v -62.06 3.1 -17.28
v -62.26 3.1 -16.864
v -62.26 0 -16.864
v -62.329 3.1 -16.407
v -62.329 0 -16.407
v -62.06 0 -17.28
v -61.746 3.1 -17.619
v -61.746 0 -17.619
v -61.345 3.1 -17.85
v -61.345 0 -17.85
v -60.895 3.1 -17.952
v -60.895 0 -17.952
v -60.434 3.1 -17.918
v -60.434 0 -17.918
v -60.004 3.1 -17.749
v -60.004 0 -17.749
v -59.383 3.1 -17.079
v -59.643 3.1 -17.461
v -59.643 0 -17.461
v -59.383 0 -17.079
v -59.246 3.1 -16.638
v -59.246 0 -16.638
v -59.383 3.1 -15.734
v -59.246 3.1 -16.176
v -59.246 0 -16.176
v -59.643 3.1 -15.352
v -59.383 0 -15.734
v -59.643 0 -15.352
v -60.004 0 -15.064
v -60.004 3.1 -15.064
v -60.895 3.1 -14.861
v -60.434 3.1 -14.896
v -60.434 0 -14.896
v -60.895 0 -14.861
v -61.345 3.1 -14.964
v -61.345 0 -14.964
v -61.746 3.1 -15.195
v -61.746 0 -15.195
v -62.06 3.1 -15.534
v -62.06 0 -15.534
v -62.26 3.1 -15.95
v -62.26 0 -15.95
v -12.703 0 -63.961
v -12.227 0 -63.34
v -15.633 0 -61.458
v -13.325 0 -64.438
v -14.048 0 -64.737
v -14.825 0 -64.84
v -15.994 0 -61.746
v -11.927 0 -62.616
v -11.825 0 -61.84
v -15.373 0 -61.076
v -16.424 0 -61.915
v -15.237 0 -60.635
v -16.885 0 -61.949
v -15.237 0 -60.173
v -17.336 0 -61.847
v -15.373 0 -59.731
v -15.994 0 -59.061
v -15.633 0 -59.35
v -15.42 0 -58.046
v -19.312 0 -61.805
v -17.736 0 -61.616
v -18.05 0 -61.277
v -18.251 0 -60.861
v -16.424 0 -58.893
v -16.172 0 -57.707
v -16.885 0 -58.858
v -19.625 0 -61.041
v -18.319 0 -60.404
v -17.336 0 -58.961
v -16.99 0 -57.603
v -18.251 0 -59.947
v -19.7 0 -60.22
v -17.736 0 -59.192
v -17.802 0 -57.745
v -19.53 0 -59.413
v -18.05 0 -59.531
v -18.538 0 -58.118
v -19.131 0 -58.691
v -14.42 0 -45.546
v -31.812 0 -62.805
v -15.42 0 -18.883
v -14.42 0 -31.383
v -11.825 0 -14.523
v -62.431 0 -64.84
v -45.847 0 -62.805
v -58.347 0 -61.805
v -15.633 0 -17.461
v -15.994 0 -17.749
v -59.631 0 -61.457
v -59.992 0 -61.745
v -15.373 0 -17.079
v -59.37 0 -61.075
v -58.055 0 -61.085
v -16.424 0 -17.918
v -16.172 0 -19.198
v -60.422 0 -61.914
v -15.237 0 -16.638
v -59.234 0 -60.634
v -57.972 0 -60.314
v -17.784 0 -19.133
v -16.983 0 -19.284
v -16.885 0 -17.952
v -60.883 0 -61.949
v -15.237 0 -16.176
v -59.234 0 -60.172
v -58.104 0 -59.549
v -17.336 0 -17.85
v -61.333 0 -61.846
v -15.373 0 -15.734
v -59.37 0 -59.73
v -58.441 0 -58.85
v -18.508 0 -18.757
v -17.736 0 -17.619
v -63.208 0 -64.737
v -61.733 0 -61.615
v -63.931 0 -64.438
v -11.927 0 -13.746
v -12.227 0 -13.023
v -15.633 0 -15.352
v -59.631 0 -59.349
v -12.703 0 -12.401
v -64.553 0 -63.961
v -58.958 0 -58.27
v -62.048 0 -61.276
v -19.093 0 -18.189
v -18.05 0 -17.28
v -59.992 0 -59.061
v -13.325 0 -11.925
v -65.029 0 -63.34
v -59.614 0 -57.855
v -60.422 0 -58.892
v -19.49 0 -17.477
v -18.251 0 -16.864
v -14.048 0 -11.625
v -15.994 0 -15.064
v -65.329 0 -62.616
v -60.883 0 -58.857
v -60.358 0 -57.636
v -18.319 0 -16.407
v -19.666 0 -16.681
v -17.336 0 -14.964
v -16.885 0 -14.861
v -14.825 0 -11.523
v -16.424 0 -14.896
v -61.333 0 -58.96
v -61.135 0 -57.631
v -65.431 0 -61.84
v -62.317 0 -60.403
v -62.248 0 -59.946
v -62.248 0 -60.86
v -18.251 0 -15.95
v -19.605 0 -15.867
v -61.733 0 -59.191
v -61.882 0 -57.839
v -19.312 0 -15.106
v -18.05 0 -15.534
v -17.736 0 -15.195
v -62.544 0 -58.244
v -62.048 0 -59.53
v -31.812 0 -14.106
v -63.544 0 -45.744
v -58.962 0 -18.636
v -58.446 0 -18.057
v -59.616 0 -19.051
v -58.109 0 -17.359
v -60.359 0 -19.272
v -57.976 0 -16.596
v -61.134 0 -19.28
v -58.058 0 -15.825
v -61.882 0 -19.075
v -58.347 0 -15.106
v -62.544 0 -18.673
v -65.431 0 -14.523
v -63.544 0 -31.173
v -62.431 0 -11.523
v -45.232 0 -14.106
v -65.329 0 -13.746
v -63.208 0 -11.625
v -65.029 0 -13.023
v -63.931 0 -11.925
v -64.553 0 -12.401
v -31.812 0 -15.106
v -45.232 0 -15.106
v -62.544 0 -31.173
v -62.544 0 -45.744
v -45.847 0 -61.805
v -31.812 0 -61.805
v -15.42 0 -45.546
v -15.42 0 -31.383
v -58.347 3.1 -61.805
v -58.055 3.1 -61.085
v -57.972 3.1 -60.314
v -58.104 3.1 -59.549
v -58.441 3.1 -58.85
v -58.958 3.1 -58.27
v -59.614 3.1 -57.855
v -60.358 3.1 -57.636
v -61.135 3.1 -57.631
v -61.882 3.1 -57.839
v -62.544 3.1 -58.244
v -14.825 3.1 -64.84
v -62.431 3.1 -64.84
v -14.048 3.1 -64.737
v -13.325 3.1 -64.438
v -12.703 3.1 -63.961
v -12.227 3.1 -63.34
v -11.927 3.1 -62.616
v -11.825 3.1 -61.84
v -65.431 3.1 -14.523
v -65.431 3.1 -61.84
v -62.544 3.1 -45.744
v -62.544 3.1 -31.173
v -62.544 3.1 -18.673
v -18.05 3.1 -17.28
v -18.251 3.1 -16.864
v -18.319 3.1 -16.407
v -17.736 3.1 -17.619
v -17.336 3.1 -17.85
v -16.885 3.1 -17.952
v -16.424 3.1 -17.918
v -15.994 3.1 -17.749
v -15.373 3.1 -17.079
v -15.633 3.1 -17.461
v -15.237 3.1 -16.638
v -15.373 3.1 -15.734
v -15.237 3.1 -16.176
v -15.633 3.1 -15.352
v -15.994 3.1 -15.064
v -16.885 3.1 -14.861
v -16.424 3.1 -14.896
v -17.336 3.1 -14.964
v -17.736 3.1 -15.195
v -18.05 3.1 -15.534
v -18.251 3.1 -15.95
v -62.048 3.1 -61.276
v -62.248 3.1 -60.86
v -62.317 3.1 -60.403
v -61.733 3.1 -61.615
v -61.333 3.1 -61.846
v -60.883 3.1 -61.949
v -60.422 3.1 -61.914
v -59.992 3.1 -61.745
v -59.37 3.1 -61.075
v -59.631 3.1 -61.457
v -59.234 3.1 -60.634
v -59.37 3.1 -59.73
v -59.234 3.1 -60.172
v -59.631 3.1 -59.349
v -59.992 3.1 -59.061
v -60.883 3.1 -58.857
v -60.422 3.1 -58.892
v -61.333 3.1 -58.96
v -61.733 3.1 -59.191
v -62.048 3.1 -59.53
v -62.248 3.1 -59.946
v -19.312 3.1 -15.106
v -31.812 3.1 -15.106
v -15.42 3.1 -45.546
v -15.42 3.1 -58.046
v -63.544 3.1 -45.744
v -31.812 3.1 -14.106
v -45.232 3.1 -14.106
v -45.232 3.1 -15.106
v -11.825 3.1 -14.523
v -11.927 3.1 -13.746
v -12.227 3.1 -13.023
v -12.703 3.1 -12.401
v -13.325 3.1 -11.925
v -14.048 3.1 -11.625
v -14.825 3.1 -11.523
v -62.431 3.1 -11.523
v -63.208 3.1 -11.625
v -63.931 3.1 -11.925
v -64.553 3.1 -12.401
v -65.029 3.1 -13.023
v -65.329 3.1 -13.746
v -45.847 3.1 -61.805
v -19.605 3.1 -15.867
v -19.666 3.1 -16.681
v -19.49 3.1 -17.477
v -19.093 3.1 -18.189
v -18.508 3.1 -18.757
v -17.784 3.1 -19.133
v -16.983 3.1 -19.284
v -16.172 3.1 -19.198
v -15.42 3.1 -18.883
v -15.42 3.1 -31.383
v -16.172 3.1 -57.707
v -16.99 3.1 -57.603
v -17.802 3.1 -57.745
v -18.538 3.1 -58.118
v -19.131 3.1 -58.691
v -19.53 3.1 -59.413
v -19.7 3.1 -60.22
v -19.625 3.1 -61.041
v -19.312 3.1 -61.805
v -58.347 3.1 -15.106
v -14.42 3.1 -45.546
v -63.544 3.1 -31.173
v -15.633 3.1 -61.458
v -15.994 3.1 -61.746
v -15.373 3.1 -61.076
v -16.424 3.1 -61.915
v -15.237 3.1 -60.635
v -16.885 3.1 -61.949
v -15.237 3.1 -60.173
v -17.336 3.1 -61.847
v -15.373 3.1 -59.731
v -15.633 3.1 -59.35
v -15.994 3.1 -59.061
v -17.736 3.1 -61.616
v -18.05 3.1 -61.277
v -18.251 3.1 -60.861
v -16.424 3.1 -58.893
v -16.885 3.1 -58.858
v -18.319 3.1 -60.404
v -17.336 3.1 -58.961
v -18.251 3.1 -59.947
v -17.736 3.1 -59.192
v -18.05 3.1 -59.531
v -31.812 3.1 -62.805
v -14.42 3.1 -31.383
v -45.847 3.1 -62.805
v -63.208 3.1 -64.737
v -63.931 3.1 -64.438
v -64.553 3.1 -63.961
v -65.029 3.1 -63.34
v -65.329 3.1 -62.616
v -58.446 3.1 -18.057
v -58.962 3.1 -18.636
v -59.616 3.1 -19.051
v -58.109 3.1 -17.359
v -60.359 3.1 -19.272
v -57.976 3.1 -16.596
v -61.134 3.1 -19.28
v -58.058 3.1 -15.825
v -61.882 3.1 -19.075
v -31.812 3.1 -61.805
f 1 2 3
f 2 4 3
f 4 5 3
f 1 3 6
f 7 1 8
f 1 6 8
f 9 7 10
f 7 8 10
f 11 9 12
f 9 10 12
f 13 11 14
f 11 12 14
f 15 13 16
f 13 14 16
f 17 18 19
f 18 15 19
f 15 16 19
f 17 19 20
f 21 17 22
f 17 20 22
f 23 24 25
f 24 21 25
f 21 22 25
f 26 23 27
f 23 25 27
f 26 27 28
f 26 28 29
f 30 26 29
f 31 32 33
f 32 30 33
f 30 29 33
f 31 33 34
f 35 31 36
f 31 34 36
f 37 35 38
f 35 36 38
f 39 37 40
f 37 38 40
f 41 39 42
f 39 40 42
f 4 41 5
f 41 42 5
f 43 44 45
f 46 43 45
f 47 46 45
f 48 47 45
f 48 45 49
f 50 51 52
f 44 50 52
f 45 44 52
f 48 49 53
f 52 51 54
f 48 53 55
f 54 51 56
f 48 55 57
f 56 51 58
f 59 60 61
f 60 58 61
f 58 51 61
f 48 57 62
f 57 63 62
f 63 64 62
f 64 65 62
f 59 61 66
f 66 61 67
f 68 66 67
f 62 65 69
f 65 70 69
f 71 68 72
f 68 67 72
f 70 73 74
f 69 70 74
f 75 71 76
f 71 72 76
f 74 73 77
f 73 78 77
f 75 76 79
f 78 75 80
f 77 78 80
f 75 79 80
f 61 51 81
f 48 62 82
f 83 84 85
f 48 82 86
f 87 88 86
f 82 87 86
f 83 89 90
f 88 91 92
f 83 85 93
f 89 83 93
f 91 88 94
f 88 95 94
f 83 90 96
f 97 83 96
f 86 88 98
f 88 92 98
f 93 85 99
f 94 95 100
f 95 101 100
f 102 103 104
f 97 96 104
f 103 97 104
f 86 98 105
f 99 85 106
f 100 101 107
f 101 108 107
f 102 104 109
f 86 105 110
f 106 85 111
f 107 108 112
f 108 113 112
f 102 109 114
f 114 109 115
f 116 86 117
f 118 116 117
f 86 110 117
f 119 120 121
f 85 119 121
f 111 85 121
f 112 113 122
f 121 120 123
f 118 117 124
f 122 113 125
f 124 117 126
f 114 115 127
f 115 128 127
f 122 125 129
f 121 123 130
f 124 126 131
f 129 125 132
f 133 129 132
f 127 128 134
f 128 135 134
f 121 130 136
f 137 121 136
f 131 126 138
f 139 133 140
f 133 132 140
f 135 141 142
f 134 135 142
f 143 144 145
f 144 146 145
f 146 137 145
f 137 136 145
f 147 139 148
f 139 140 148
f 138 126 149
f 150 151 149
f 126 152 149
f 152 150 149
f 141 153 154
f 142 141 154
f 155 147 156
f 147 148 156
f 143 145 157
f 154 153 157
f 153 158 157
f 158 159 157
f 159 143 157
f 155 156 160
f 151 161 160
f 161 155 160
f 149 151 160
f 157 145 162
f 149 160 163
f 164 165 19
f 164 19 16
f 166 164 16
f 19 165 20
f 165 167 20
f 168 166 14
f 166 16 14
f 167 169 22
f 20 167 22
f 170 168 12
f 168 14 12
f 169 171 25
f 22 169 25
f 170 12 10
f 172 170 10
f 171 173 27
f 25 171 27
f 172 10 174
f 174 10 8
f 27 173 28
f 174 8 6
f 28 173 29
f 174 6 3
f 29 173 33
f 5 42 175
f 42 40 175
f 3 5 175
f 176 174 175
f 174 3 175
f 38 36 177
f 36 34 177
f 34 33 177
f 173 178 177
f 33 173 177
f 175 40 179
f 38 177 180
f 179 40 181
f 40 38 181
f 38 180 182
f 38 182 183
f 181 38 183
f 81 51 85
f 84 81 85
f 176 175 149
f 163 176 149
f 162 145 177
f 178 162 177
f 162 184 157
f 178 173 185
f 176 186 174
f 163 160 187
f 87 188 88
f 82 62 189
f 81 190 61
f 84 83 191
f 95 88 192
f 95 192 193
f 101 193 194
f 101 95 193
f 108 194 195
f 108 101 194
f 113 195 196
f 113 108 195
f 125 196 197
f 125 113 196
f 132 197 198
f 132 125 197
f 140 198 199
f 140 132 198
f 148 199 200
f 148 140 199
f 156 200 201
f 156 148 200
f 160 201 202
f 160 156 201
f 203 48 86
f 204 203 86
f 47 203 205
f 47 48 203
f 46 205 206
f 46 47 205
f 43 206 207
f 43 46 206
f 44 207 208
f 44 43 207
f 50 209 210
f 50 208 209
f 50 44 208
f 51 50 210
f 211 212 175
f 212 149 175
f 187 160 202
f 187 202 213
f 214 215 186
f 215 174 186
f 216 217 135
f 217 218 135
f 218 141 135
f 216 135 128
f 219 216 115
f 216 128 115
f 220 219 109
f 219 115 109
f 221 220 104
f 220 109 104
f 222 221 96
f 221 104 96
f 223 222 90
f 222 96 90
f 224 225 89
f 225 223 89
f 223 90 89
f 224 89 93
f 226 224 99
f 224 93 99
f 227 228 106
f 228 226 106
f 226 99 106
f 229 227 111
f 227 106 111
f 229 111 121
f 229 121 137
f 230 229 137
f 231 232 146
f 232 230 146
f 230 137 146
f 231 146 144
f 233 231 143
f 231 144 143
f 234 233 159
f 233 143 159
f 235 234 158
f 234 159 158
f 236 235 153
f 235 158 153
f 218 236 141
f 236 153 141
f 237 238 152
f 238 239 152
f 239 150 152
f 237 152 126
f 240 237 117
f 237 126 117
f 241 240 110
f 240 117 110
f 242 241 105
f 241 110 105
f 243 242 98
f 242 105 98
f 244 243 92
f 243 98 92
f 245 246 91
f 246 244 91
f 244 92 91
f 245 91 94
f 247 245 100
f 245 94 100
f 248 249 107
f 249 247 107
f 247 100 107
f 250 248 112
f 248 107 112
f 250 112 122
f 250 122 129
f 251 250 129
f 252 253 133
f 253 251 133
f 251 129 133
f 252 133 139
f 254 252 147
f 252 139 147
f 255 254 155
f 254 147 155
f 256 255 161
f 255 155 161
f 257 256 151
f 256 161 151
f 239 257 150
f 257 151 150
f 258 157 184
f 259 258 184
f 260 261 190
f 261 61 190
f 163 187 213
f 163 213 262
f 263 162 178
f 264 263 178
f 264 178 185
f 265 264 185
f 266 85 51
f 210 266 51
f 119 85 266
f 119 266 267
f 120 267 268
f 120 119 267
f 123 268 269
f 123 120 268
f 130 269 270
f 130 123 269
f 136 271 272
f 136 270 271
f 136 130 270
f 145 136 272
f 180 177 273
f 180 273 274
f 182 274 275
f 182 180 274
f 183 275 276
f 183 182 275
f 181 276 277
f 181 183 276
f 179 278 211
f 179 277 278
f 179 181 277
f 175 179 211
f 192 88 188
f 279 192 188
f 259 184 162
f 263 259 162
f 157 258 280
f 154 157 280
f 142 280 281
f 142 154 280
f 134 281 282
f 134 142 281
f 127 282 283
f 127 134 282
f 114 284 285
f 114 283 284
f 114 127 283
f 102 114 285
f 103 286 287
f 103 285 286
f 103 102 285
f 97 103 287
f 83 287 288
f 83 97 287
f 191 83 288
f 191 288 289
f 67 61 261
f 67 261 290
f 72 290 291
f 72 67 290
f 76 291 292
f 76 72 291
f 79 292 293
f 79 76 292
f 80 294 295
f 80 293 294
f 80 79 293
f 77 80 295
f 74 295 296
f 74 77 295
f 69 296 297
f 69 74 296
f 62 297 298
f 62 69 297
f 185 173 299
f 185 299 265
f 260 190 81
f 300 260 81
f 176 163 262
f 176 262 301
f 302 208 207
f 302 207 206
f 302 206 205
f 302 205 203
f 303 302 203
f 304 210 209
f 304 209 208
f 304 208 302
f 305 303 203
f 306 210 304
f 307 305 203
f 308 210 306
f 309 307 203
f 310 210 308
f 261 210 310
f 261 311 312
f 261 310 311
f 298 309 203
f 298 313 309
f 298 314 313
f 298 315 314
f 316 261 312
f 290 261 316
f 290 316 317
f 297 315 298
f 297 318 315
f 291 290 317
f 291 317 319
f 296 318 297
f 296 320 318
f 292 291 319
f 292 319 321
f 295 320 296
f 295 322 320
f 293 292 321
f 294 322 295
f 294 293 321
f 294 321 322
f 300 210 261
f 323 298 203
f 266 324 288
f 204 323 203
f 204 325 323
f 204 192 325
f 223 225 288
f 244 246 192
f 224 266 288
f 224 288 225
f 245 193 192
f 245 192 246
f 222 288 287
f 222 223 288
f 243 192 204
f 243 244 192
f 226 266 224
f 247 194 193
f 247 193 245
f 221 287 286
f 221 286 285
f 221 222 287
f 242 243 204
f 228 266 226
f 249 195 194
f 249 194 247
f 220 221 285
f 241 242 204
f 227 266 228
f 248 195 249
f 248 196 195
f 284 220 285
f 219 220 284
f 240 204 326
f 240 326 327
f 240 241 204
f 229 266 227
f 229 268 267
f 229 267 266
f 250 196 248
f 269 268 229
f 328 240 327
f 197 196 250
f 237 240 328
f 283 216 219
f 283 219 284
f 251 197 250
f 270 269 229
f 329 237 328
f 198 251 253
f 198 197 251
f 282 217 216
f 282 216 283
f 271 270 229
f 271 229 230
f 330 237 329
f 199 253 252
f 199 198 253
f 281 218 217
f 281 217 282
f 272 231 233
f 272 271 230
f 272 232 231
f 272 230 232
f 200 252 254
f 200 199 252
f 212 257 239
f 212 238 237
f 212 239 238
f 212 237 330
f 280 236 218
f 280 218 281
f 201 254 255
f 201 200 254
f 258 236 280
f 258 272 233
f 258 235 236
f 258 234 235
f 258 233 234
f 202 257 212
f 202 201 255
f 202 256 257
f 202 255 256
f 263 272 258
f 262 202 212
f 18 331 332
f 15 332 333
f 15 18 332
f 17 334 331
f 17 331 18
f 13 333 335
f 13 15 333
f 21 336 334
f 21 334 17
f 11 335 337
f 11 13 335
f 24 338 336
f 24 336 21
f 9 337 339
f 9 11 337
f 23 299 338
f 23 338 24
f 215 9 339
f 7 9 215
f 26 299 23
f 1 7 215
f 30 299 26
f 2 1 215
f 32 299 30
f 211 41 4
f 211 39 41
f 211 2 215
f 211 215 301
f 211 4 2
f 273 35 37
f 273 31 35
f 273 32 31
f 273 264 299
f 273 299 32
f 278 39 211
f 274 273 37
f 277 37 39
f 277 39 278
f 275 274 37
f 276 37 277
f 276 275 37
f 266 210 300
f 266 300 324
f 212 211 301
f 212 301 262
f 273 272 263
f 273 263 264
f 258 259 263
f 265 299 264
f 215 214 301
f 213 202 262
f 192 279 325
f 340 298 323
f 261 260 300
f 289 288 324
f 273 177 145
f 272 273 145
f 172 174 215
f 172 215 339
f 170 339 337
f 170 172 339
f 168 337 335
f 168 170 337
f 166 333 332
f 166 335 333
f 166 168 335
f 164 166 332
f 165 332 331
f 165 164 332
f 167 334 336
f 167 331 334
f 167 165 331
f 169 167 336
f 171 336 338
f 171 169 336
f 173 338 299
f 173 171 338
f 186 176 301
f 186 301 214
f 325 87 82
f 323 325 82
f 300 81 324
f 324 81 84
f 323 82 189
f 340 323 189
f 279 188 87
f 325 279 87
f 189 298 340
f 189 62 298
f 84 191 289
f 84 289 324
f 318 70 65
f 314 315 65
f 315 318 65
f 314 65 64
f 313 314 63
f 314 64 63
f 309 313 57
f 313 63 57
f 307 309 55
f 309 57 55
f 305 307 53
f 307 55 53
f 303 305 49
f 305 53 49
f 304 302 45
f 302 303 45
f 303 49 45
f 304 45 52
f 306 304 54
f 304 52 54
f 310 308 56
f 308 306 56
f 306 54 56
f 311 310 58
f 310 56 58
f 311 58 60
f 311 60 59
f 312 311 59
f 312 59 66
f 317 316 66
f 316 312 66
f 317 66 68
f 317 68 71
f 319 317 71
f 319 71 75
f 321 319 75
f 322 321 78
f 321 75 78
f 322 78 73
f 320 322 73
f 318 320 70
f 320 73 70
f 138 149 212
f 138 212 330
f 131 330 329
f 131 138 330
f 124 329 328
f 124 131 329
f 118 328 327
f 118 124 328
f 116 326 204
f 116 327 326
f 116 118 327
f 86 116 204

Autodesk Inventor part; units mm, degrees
ref_plane "YZ Plane" through (0, 0, 0) normal (1, 0, 0) x (0, 1, 0)
ref_plane "XZ Plane" through (0, 0, 0) normal (0, 1, 0) x (-1, 0, 0)
ref_plane "XY Plane" through (0, 0, 0) normal (0, 0, 1) x (1, 0, 0)
sketch "Baseline" plane through (0, 0, 0) normal (0, 1, 0) x (-1, 0, 0)
  line L0 (61.0726, -11.6756) -> (16.1384, -11.6756)
  spline S0 degree 3 poles (16.1384, -11.6756) (13.8101, -11.6756) (11.9051, -13.5806) (11.9051, -15.909) knots 1 1 1 1 2 2 2 2
  line L1 (16.1384, -11.6756) -> (13.8101, -11.6756) construction
  line L2 (13.8101, -11.6756) -> (11.9051, -13.5806) construction
  line L3 (11.9051, -13.5806) -> (11.9051, -15.909) construction
  line L4 (11.9051, -15.909) -> (11.9051, -60.661)
  spline S1 degree 3 poles (11.9051, -60.661) (11.9051, -62.9893) (13.8101, -64.8943) (16.1384, -64.8943) knots 3 3 3 3 4 4 4 4
  line L5 (11.9051, -60.661) -> (11.9051, -62.9893) construction
  line L6 (11.9051, -62.9893) -> (13.8101, -64.8943) construction
  line L7 (13.8101, -64.8943) -> (16.1384, -64.8943) construction
  line L8 (16.1384, -64.8943) -> (61.0726, -64.8943)
  spline S2 degree 3 poles (61.0726, -64.8943) (63.4009, -64.8943) (65.3059, -62.9893) (65.3059, -60.661) knots 5 5 5 5 6 6 6 6
  line L9 (61.0726, -64.8943) -> (63.4009, -64.8943) construction
  line L10 (63.4009, -64.8943) -> (65.3059, -62.9893) construction
  line L11 (65.3059, -62.9893) -> (65.3059, -60.661) construction
  line L12 (65.3059, -60.661) -> (65.3059, -15.909)
  spline S3 degree 3 poles (65.3059, -15.909) (65.3059, -13.5806) (63.4009, -11.6756) (61.0726, -11.6756) knots 7 7 7 7 8 8 8 8
  line L13 (65.3059, -15.909) -> (65.3059, -13.5806) construction
  line L14 (65.3059, -13.5806) -> (63.4009, -11.6756) construction
  line L15 (63.4009, -11.6756) -> (61.0726, -11.6756) construction
  spline S4 degree 3 poles (59.9166, -15.3859) (59.9168, -15.3857) (59.9171, -15.3855) (59.9173, -15.3853) knots 0 0 0 0 1 1 1 1
  line L16 (59.9166, -15.3859) -> (59.9168, -15.3857) construction
  line L17 (59.9168, -15.3857) -> (59.9171, -15.3855) construction
  line L18 (59.9171, -15.3855) -> (59.9173, -15.3853) construction
  line L19 (59.9173, -15.3853) -> (59.9173, -15.3854)
  spline S5 degree 3 poles (59.9173, -15.3854) (60.1545, -15.1997) (60.4494, -15.0845) (60.7739, -15.0845) (61.5454, -15.0845) (62.1709, -15.7099) (62.1709, -16.4815) (62.1709, -16.7261) (62.1024, -16.9527) (61.9919, -17.1527) knots 2 2 2 2 3 3 3 4 4 4 5 5 5 5
  line L20 (59.9173, -15.3854) -> (60.1545, -15.1997) construction
  line L21 (60.1545, -15.1997) -> (60.4494, -15.0845) construction
  line L22 (60.4494, -15.0845) -> (60.7739, -15.0845) construction
  line L23 (60.7739, -15.0845) -> (61.5454, -15.0845) construction
  line L24 (61.5454, -15.0845) -> (62.1709, -15.7099) construction
  line L25 (62.1709, -15.7099) -> (62.1709, -16.4815) construction
  line L26 (62.1709, -16.4815) -> (62.1709, -16.7261) construction
  line L27 (62.1709, -16.7261) -> (62.1024, -16.9527) construction
  line L28 (62.1024, -16.9527) -> (61.9919, -17.1527) construction
  line L29 (61.9919, -17.1527) -> (61.9919, -17.1527)
  spline S6 degree 3 poles (61.9919, -17.1527) (61.9084, -17.3039) (61.7991, -17.4365) (61.6678, -17.5468) knots 7 7 7 7 8 8 8 8
  line L30 (61.9919, -17.1527) -> (61.9084, -17.3039) construction
  line L31 (61.9084, -17.3039) -> (61.7991, -17.4365) construction
  line L32 (61.7991, -17.4365) -> (61.6678, -17.5468) construction
  spline S7 degree 3 poles (61.6678, -17.5468) (61.6518, -17.5604) (61.6359, -17.5739) (61.6194, -17.5867) knots 8 8 8 8 9 9 9 9
  line L33 (61.6678, -17.5468) -> (61.6518, -17.5604) construction
  line L34 (61.6518, -17.5604) -> (61.6359, -17.5739) construction
  line L35 (61.6359, -17.5739) -> (61.6194, -17.5867) construction
  spline S8 degree 3 poles (61.6194, -17.5867) (61.583, -17.6147) (61.5464, -17.6415) (61.5073, -17.6658) knots 9 9 9 9 10 10 10 10
  line L36 (61.6194, -17.5867) -> (61.583, -17.6147) construction
  line L37 (61.583, -17.6147) -> (61.5464, -17.6415) construction
  line L38 (61.5464, -17.6415) -> (61.5073, -17.6658) construction
  spline S9 degree 3 poles (61.5073, -17.6658) (61.4604, -17.6954) (61.4112, -17.7214) (61.3608, -17.7453) knots 10 10 10 10 11 11 11 11
  line L39 (61.5073, -17.6658) -> (61.4604, -17.6954) construction
  line L40 (61.4604, -17.6954) -> (61.4112, -17.7214) construction
  line L41 (61.4112, -17.7214) -> (61.3608, -17.7453) construction
  spline S10 degree 3 poles (61.3608, -17.7453) (61.3302, -17.7595) (61.2994, -17.7722) (61.2677, -17.7842) knots 11 11 11 11 12 12 12 12
  line L42 (61.3608, -17.7453) -> (61.3302, -17.7595) construction
  line L43 (61.3302, -17.7595) -> (61.2994, -17.7722) construction
  line L44 (61.2994, -17.7722) -> (61.2677, -17.7842) construction
  spline S11 degree 3 poles (61.2677, -17.7842) (61.2113, -17.8059) (61.1534, -17.824) (61.0936, -17.8382) knots 12 12 12 12 13 13 13 13
  line L45 (61.2677, -17.7842) -> (61.2113, -17.8059) construction
  line L46 (61.2113, -17.8059) -> (61.1534, -17.824) construction
  line L47 (61.1534, -17.824) -> (61.0936, -17.8382) construction
  spline S12 degree 3 poles (61.0936, -17.8382) (61.0698, -17.8439) (61.0461, -17.8491) (61.0217, -17.8535) knots 13 13 13 13 14 14 14 14
  line L48 (61.0936, -17.8382) -> (61.0698, -17.8439) construction
  line L49 (61.0698, -17.8439) -> (61.0461, -17.8491) construction
  line L50 (61.0461, -17.8491) -> (61.0217, -17.8535) construction
  spline S13 degree 3 poles (61.0217, -17.8535) (60.9411, -17.8682) (60.8589, -17.8785) (60.7739, -17.8785) (60.0023, -17.8785) (59.3769, -17.253) (59.3769, -16.4815) (59.3769, -16.3956) (59.387, -16.3124) (59.4021, -16.2311) knots 14 14 14 14 15 15 15 16 16 16 17 17 17 17
  line L51 (61.0217, -17.8535) -> (60.9411, -17.8682) construction
  line L52 (60.9411, -17.8682) -> (60.8589, -17.8785) construction
  line L53 (60.8589, -17.8785) -> (60.7739, -17.8785) construction
  line L54 (60.7739, -17.8785) -> (60.0023, -17.8785) construction
  line L55 (60.0023, -17.8785) -> (59.3769, -17.253) construction
  line L56 (59.3769, -17.253) -> (59.3769, -16.4815) construction
  line L57 (59.3769, -16.4815) -> (59.3769, -16.3956) construction
  line L58 (59.3769, -16.3956) -> (59.387, -16.3124) construction
  line L59 (59.387, -16.3124) -> (59.4021, -16.2311) construction
  spline S14 degree 3 poles (59.4021, -16.2311) (59.4052, -16.2142) (59.4075, -16.1974) (59.4112, -16.1808) knots 17 17 17 17 18 18 18 18
  line L60 (59.4021, -16.2311) -> (59.4052, -16.2142) construction
  line L61 (59.4052, -16.2142) -> (59.4075, -16.1974) construction
  line L62 (59.4075, -16.1974) -> (59.4112, -16.1808) construction
  spline S15 degree 3 poles (59.4112, -16.1808) (59.4271, -16.11) (59.4487, -16.0414) (59.475, -15.9752) knots 18 18 18 18 19 19 19 19
  line L63 (59.4112, -16.1808) -> (59.4271, -16.11) construction
  line L64 (59.4271, -16.11) -> (59.4487, -16.0414) construction
  line L65 (59.4487, -16.0414) -> (59.475, -15.9752) construction
  spline S16 degree 3 poles (59.475, -15.9752) (59.486, -15.9472) (59.4982, -15.9203) (59.5108, -15.8933) knots 19 19 19 19 20 20 20 20
  line L66 (59.475, -15.9752) -> (59.486, -15.9472) construction
  line L67 (59.486, -15.9472) -> (59.4982, -15.9203) construction
  line L68 (59.4982, -15.9203) -> (59.5108, -15.8933) construction
  spline S17 degree 3 poles (59.5108, -15.8933) (59.5311, -15.8506) (59.5537, -15.8095) (59.5781, -15.7694) knots 20 20 20 20 21 21 21 21
  line L69 (59.5108, -15.8933) -> (59.5311, -15.8506) construction
  line L70 (59.5311, -15.8506) -> (59.5537, -15.8095) construction
  line L71 (59.5537, -15.8095) -> (59.5781, -15.7694) construction
  spline S18 degree 3 poles (59.5781, -15.7694) (59.6085, -15.7183) (59.6422, -15.6703) (59.6788, -15.6237) knots 21 21 21 21 22 22 22 22
  line L72 (59.5781, -15.7694) -> (59.6085, -15.7183) construction
  line L73 (59.6085, -15.7183) -> (59.6422, -15.6703) construction
  line L74 (59.6422, -15.6703) -> (59.6788, -15.6237) construction
  spline S19 degree 3 poles (59.6788, -15.6237) (59.69, -15.6095) (59.7015, -15.5956) (59.7133, -15.5819) knots 22 22 22 22 23 23 23 23
  line L75 (59.6788, -15.6237) -> (59.69, -15.6095) construction
  line L76 (59.69, -15.6095) -> (59.7015, -15.5956) construction
  line L77 (59.7015, -15.5956) -> (59.7133, -15.5819) construction
  spline S20 degree 3 poles (59.7133, -15.5819) (59.7745, -15.5098) (59.8421, -15.4444) (59.9166, -15.3859) knots 23 23 23 23 24 24 24 24
  line L78 (59.7133, -15.5819) -> (59.7745, -15.5098) construction
  line L79 (59.7745, -15.5098) -> (59.8421, -15.4444) construction
  line L80 (59.8421, -15.4444) -> (59.9166, -15.3859) construction
  spline S21 degree 3 poles (16.8742, -15.0845) (17.2556, -15.0845) (17.6005, -15.2381) (17.8525, -15.4858) knots 0 0 0 0 1 1 1 1
  line L81 (16.8742, -15.0845) -> (17.2556, -15.0845) construction
  line L82 (17.2556, -15.0845) -> (17.6005, -15.2381) construction
  line L83 (17.6005, -15.2381) -> (17.8525, -15.4858) construction
  line L84 (17.8525, -15.4858) -> (17.8526, -15.4858)
  spline S22 degree 3 poles (17.8526, -15.4858) (17.8526, -15.4858) (17.8526, -15.4859) (17.8526, -15.4859) knots 2 2 2 2 3 3 3 3
  line L85 (17.8526, -15.4858) -> (17.8526, -15.4858) construction
  line L86 (17.8526, -15.4858) -> (17.8526, -15.4859) construction
  line L87 (17.8526, -15.4859) -> (17.8526, -15.4859) construction
  spline S23 degree 3 poles (17.8526, -15.4859) (17.9793, -15.6103) (18.0817, -15.7586) (18.1538, -15.9236) knots 3 3 3 3 4 4 4 4
  line L88 (17.8526, -15.4859) -> (17.9793, -15.6103) construction
  line L89 (17.9793, -15.6103) -> (18.0817, -15.7586) construction
  line L90 (18.0817, -15.7586) -> (18.1538, -15.9236) construction
  spline S24 degree 3 poles (18.1538, -15.9236) (18.1552, -15.9268) (18.1574, -15.9295) (18.1587, -15.9327) knots 4 4 4 4 5 5 5 5
  line L91 (18.1538, -15.9236) -> (18.1552, -15.9268) construction
  line L92 (18.1552, -15.9268) -> (18.1574, -15.9295) construction
  line L93 (18.1574, -15.9295) -> (18.1587, -15.9327) construction
  spline S25 degree 3 poles (18.1587, -15.9327) (18.1905, -16.0071) (18.2137, -16.0857) (18.2323, -16.166) knots 5 5 5 5 6 6 6 6
  line L94 (18.1587, -15.9327) -> (18.1905, -16.0071) construction
  line L95 (18.1905, -16.0071) -> (18.2137, -16.0857) construction
  line L96 (18.2137, -16.0857) -> (18.2323, -16.166) construction
  spline S26 degree 3 poles (18.2323, -16.166) (18.2348, -16.1769) (18.2399, -16.1867) (18.2422, -16.1977) knots 6 6 6 6 7 7 7 7
  line L97 (18.2323, -16.166) -> (18.2348, -16.1769) construction
  line L98 (18.2348, -16.1769) -> (18.2399, -16.1867) construction
  line L99 (18.2399, -16.1867) -> (18.2422, -16.1977) construction
  spline S27 degree 3 poles (18.2422, -16.1977) (18.2611, -16.2893) (18.2712, -16.3842) (18.2712, -16.4815) (18.2712, -16.8672) (18.1149, -17.2165) (17.8621, -17.4693) knots 7 7 7 7 8 8 8 9 9 9 9
  line L100 (18.2422, -16.1977) -> (18.2611, -16.2893) construction
  line L101 (18.2611, -16.2893) -> (18.2712, -16.3842) construction
  line L102 (18.2712, -16.3842) -> (18.2712, -16.4815) construction
  line L103 (18.2712, -16.4815) -> (18.2712, -16.8672) construction
  line L104 (18.2712, -16.8672) -> (18.1149, -17.2165) construction
  line L105 (18.1149, -17.2165) -> (17.8621, -17.4693) construction
  spline S28 degree 3 poles (17.8621, -17.4693) (17.6725, -17.6589) (17.4286, -17.7943) (17.1558, -17.8501) knots 9 9 9 9 10 10 10 10
  line L106 (17.8621, -17.4693) -> (17.6725, -17.6589) construction
  line L107 (17.6725, -17.6589) -> (17.4286, -17.7943) construction
  line L108 (17.4286, -17.7943) -> (17.1558, -17.8501) construction
  spline S29 degree 3 poles (17.1558, -17.8501) (17.0648, -17.8687) (16.9707, -17.8785) (16.8742, -17.8785) (16.7745, -17.8785) (16.6776, -17.8672) (16.5839, -17.8474) knots 10 10 10 10 11 11 11 12 12 12 12
  line L109 (17.1558, -17.8501) -> (17.0648, -17.8687) construction
  line L110 (17.0648, -17.8687) -> (16.9707, -17.8785) construction
  line L111 (16.9707, -17.8785) -> (16.8742, -17.8785) construction
  line L112 (16.8742, -17.8785) -> (16.7745, -17.8785) construction
  line L113 (16.7745, -17.8785) -> (16.6776, -17.8672) construction
  line L114 (16.6776, -17.8672) -> (16.5839, -17.8474) construction
  spline S30 degree 3 poles (16.5839, -17.8474) (16.5698, -17.8443) (16.5571, -17.8382) (16.5433, -17.8348) knots 12 12 12 12 13 13 13 13
  line L115 (16.5839, -17.8474) -> (16.5698, -17.8443) construction
  line L116 (16.5698, -17.8443) -> (16.5571, -17.8382) construction
  line L117 (16.5571, -17.8382) -> (16.5433, -17.8348) construction
  spline S31 degree 3 poles (16.5433, -17.8348) (16.4629, -17.8152) (16.3847, -17.7907) (16.3105, -17.7579) knots 13 13 13 13 14 14 14 14
  line L118 (16.5433, -17.8348) -> (16.4629, -17.8152) construction
  line L119 (16.4629, -17.8152) -> (16.3847, -17.7907) construction
  line L120 (16.3847, -17.7907) -> (16.3105, -17.7579) construction
  spline S32 degree 3 poles (16.3105, -17.7579) (16.3052, -17.7555) (16.3005, -17.752) (16.2952, -17.7496) knots 14 14 14 14 15 15 15 15
  line L121 (16.3105, -17.7579) -> (16.3052, -17.7555) construction
  line L122 (16.3052, -17.7555) -> (16.3005, -17.752) construction
  line L123 (16.3005, -17.752) -> (16.2952, -17.7496) construction
  spline S33 degree 3 poles (16.2952, -17.7496) (16.1272, -17.6727) (15.9783, -17.5637) (15.8541, -17.4302) knots 15 15 15 15 16 16 16 16
  line L124 (16.2952, -17.7496) -> (16.1272, -17.6727) construction
  line L125 (16.1272, -17.6727) -> (15.9783, -17.5637) construction
  line L126 (15.9783, -17.5637) -> (15.8541, -17.4302) construction
  spline S34 degree 3 poles (15.8541, -17.4302) (15.6221, -17.1808) (15.4772, -16.849) (15.4772, -16.4815) (15.4772, -15.7099) (16.1027, -15.0845) (16.8742, -15.0845) knots 18 18 18 18 19 19 19 20 20 20 20
  line L127 (15.8541, -17.4302) -> (15.6221, -17.1808) construction
  line L128 (15.6221, -17.1808) -> (15.4772, -16.849) construction
  line L129 (15.4772, -16.849) -> (15.4772, -16.4815) construction
  line L130 (15.4772, -16.4815) -> (15.4772, -15.7099) construction
  line L131 (15.4772, -15.7099) -> (16.1027, -15.0845) construction
  line L132 (16.1027, -15.0845) -> (16.8742, -15.0845) construction
  line L133 (17.8793, -61.432) -> (17.8793, -61.4321)
  spline S35 degree 3 poles (17.8793, -61.4321) (17.6285, -61.6715) (17.2906, -61.8205) (16.9166, -61.8205) (16.145, -61.8205) (15.5195, -61.195) (15.5195, -60.4235) (15.5195, -59.9667) (15.742, -59.5649) (16.0811, -59.31) knots 2 2 2 2 3 3 3 4 4 4 5 5 5 5
  line L134 (17.8793, -61.4321) -> (17.6285, -61.6715) construction
  line L135 (17.6285, -61.6715) -> (17.2906, -61.8205) construction
  line L136 (17.2906, -61.8205) -> (16.9166, -61.8205) construction
  line L137 (16.9166, -61.8205) -> (16.145, -61.8205) construction
  line L138 (16.145, -61.8205) -> (15.5195, -61.195) construction
  line L139 (15.5195, -61.195) -> (15.5195, -60.4235) construction
  line L140 (15.5195, -60.4235) -> (15.5195, -59.9667) construction
  line L141 (15.5195, -59.9667) -> (15.742, -59.5649) construction
  line L142 (15.742, -59.5649) -> (16.0811, -59.31) construction
  spline S36 degree 3 poles (16.0811, -59.31) (16.0818, -59.3094) (16.0823, -59.3088) (16.0831, -59.3083) knots 5 5 5 5 6 6 6 6
  line L143 (16.0811, -59.31) -> (16.0818, -59.3094) construction
  line L144 (16.0818, -59.3094) -> (16.0823, -59.3088) construction
  line L145 (16.0823, -59.3088) -> (16.0831, -59.3083) construction
  spline S37 degree 3 poles (16.0831, -59.3083) (16.155, -59.2545) (16.2317, -59.2079) (16.3134, -59.1685) knots 6 6 6 6 7 7 7 7
  line L146 (16.0831, -59.3083) -> (16.155, -59.2545) construction
  line L147 (16.155, -59.2545) -> (16.2317, -59.2079) construction
  line L148 (16.2317, -59.2079) -> (16.3134, -59.1685) construction
  spline S38 degree 3 poles (16.3134, -59.1685) (16.3218, -59.1643) (16.3295, -59.1591) (16.3381, -59.1551) knots 7 7 7 7 8 8 8 8
  line L149 (16.3134, -59.1685) -> (16.3218, -59.1643) construction
  line L150 (16.3218, -59.1643) -> (16.3295, -59.1591) construction
  line L151 (16.3295, -59.1591) -> (16.3381, -59.1551) construction
  spline S39 degree 3 poles (16.3381, -59.1551) (16.412, -59.1213) (16.4898, -59.0956) (16.57, -59.075) knots 8 8 8 8 9 9 9 9
  line L152 (16.3381, -59.1551) -> (16.412, -59.1213) construction
  line L153 (16.412, -59.1213) -> (16.4898, -59.0956) construction
  line L154 (16.4898, -59.0956) -> (16.57, -59.075) construction
  spline S40 degree 3 poles (16.57, -59.075) (16.5869, -59.0706) (16.6024, -59.0635) (16.6196, -59.0597) knots 9 9 9 9 10 10 10 10
  line L155 (16.57, -59.075) -> (16.5869, -59.0706) construction
  line L156 (16.5869, -59.0706) -> (16.6024, -59.0635) construction
  line L157 (16.6024, -59.0635) -> (16.6196, -59.0597) construction
  spline S41 degree 3 poles (16.6196, -59.0597) (16.7155, -59.0389) (16.8144, -59.0265) (16.9166, -59.0265) (17.013, -59.0265) (17.1072, -59.0363) (17.1981, -59.0549) knots 10 10 10 10 11 11 11 12 12 12 12
  line L158 (16.6196, -59.0597) -> (16.7155, -59.0389) construction
  line L159 (16.7155, -59.0389) -> (16.8144, -59.0265) construction
  line L160 (16.8144, -59.0265) -> (16.9166, -59.0265) construction
  line L161 (16.9166, -59.0265) -> (17.013, -59.0265) construction
  line L162 (17.013, -59.0265) -> (17.1072, -59.0363) construction
  line L163 (17.1072, -59.0363) -> (17.1981, -59.0549) construction
  spline S42 degree 3 poles (17.1981, -59.0549) (17.4709, -59.1107) (17.7148, -59.246) (17.9044, -59.4357) (18.1572, -59.6885) (18.3136, -60.0377) (18.3136, -60.4235) (18.3136, -60.522) (18.3028, -60.618) (18.2834, -60.7107) knots 12 12 12 12 13 13 13 14 14 14 15 15 15 15
  line L164 (17.1981, -59.0549) -> (17.4709, -59.1107) construction
  line L165 (17.4709, -59.1107) -> (17.7148, -59.246) construction
  line L166 (17.7148, -59.246) -> (17.9044, -59.4357) construction
  line L167 (17.9044, -59.4357) -> (18.1572, -59.6885) construction
  line L168 (18.1572, -59.6885) -> (18.3136, -60.0377) construction
  line L169 (18.3136, -60.0377) -> (18.3136, -60.4235) construction
  line L170 (18.3136, -60.4235) -> (18.3136, -60.522) construction
  line L171 (18.3136, -60.522) -> (18.3028, -60.618) construction
  line L172 (18.3028, -60.618) -> (18.2834, -60.7107) construction
  spline S43 degree 3 poles (18.2834, -60.7107) (18.2806, -60.724) (18.2747, -60.736) (18.2715, -60.7491) knots 15 15 15 15 16 16 16 16
  line L173 (18.2834, -60.7107) -> (18.2806, -60.724) construction
  line L174 (18.2806, -60.724) -> (18.2747, -60.736) construction
  line L175 (18.2747, -60.736) -> (18.2715, -60.7491) construction
  spline S44 degree 3 poles (18.2715, -60.7491) (18.2524, -60.8288) (18.2288, -60.9066) (18.1967, -60.9803) knots 16 16 16 16 17 17 17 17
  line L176 (18.2715, -60.7491) -> (18.2524, -60.8288) construction
  line L177 (18.2524, -60.8288) -> (18.2288, -60.9066) construction
  line L178 (18.2288, -60.9066) -> (18.1967, -60.9803) construction
  spline S45 degree 3 poles (18.1967, -60.9803) (18.1948, -60.9846) (18.192, -60.9883) (18.19, -60.9926) knots 17 17 17 17 18 18 18 18
  line L179 (18.1967, -60.9803) -> (18.1948, -60.9846) construction
  line L180 (18.1948, -60.9846) -> (18.192, -60.9883) construction
  line L181 (18.192, -60.9883) -> (18.19, -60.9926) construction
  spline S46 degree 3 poles (18.19, -60.9926) (18.1154, -61.1592) (18.0095, -61.3077) (17.8793, -61.432) knots 18 18 18 18 19 19 19 19
  line L182 (18.19, -60.9926) -> (18.1154, -61.1592) construction
  line L183 (18.1154, -61.1592) -> (18.0095, -61.3077) construction
  line L184 (18.0095, -61.3077) -> (17.8793, -61.432) construction
  spline S47 degree 3 poles (60.7739, -61.8205) (60.4493, -61.8205) (60.1545, -61.7053) (59.9173, -61.5196) knots 0 0 0 0 1 1 1 1
  line L185 (60.7739, -61.8205) -> (60.4493, -61.8205) construction
  line L186 (60.4493, -61.8205) -> (60.1545, -61.7053) construction
  line L187 (60.1545, -61.7053) -> (59.9173, -61.5196) construction
  line L188 (59.9173, -61.5196) -> (59.9171, -61.5194)
  spline S48 degree 3 poles (59.9171, -61.5194) (59.8423, -61.4608) (59.7745, -61.3953) (59.7131, -61.3229) knots 3 3 3 3 4 4 4 4
  line L189 (59.9171, -61.5194) -> (59.8423, -61.4608) construction
  line L190 (59.8423, -61.4608) -> (59.7745, -61.3953) construction
  line L191 (59.7745, -61.3953) -> (59.7131, -61.3229) construction
  spline S49 degree 3 poles (59.7131, -61.3229) (59.7014, -61.3093) (59.6901, -61.2955) (59.6789, -61.2815) knots 4 4 4 4 5 5 5 5
  line L192 (59.7131, -61.3229) -> (59.7014, -61.3093) construction
  line L193 (59.7014, -61.3093) -> (59.6901, -61.2955) construction
  line L194 (59.6901, -61.2955) -> (59.6789, -61.2815) construction
  spline S50 degree 3 poles (59.6789, -61.2815) (59.6422, -61.2347) (59.6084, -61.1865) (59.5778, -61.1352) knots 5 5 5 5 6 6 6 6
  line L195 (59.6789, -61.2815) -> (59.6422, -61.2347) construction
  line L196 (59.6422, -61.2347) -> (59.6084, -61.1865) construction
  line L197 (59.6084, -61.1865) -> (59.5778, -61.1352) construction
  spline S51 degree 3 poles (59.5778, -61.1352) (59.5536, -61.0952) (59.5311, -61.0543) (59.5109, -61.0119) knots 6 6 6 6 7 7 7 7
  line L198 (59.5778, -61.1352) -> (59.5536, -61.0952) construction
  line L199 (59.5536, -61.0952) -> (59.5311, -61.0543) construction
  line L200 (59.5311, -61.0543) -> (59.5109, -61.0119) construction
  spline S52 degree 3 poles (59.5109, -61.0119) (59.4982, -60.9847) (59.486, -60.9578) (59.475, -60.9298) knots 7 7 7 7 8 8 8 8
  line L201 (59.5109, -61.0119) -> (59.4982, -60.9847) construction
  line L202 (59.4982, -60.9847) -> (59.486, -60.9578) construction
  line L203 (59.486, -60.9578) -> (59.475, -60.9298) construction
  spline S53 degree 3 poles (59.475, -60.9298) (59.4487, -60.8635) (59.4271, -60.795) (59.4112, -60.7241) knots 8 8 8 8 9 9 9 9
  line L204 (59.475, -60.9298) -> (59.4487, -60.8635) construction
  line L205 (59.4487, -60.8635) -> (59.4271, -60.795) construction
  line L206 (59.4271, -60.795) -> (59.4112, -60.7241) construction
  spline S54 degree 3 poles (59.4112, -60.7241) (59.4075, -60.7075) (59.4052, -60.6907) (59.4021, -60.6739) knots 9 9 9 9 10 10 10 10
  line L207 (59.4112, -60.7241) -> (59.4075, -60.7075) construction
  line L208 (59.4075, -60.7075) -> (59.4052, -60.6907) construction
  line L209 (59.4052, -60.6907) -> (59.4021, -60.6739) construction
  spline S55 degree 3 poles (59.4021, -60.6739) (59.387, -60.5925) (59.3769, -60.5094) (59.3769, -60.4235) (59.3769, -59.6519) (60.0023, -59.0265) (60.7739, -59.0265) (60.8589, -59.0265) (60.9411, -59.0368) (61.0217, -59.0515) knots 10 10 10 10 11 11 11 12 12 12 13 13 13 13
  line L210 (59.4021, -60.6739) -> (59.387, -60.5925) construction
  line L211 (59.387, -60.5925) -> (59.3769, -60.5094) construction
  line L212 (59.3769, -60.5094) -> (59.3769, -60.4235) construction
  line L213 (59.3769, -60.4235) -> (59.3769, -59.6519) construction
  line L214 (59.3769, -59.6519) -> (60.0023, -59.0265) construction
  line L215 (60.0023, -59.0265) -> (60.7739, -59.0265) construction
  line L216 (60.7739, -59.0265) -> (60.8589, -59.0265) construction
  line L217 (60.8589, -59.0265) -> (60.9411, -59.0368) construction
  line L218 (60.9411, -59.0368) -> (61.0217, -59.0515) construction
  spline S56 degree 3 poles (61.0217, -59.0515) (61.0461, -59.0558) (61.0698, -59.0611) (61.0936, -59.0667) knots 13 13 13 13 14 14 14 14
  line L219 (61.0217, -59.0515) -> (61.0461, -59.0558) construction
  line L220 (61.0461, -59.0558) -> (61.0698, -59.0611) construction
  line L221 (61.0698, -59.0611) -> (61.0936, -59.0667) construction
  spline S57 degree 3 poles (61.0936, -59.0667) (61.1534, -59.081) (61.2113, -59.099) (61.2677, -59.1208) knots 14 14 14 14 15 15 15 15
  line L222 (61.0936, -59.0667) -> (61.1534, -59.081) construction
  line L223 (61.1534, -59.081) -> (61.2113, -59.099) construction
  line L224 (61.2113, -59.099) -> (61.2677, -59.1208) construction
  spline S58 degree 3 poles (61.2677, -59.1208) (61.2994, -59.1328) (61.3302, -59.1455) (61.3608, -59.1597) knots 15 15 15 15 16 16 16 16
  line L225 (61.2677, -59.1208) -> (61.2994, -59.1328) construction
  line L226 (61.2994, -59.1328) -> (61.3302, -59.1455) construction
  line L227 (61.3302, -59.1455) -> (61.3608, -59.1597) construction
  spline S59 degree 3 poles (61.3608, -59.1597) (61.4112, -59.1836) (61.4604, -59.2096) (61.5073, -59.2392) knots 16 16 16 16 17 17 17 17
  line L228 (61.3608, -59.1597) -> (61.4112, -59.1836) construction
  line L229 (61.4112, -59.1836) -> (61.4604, -59.2096) construction
  line L230 (61.4604, -59.2096) -> (61.5073, -59.2392) construction
  spline S60 degree 3 poles (61.5073, -59.2392) (61.5464, -59.2635) (61.583, -59.2903) (61.6194, -59.3182) knots 17 17 17 17 18 18 18 18
  line L231 (61.5073, -59.2392) -> (61.5464, -59.2635) construction
  line L232 (61.5464, -59.2635) -> (61.583, -59.2903) construction
  line L233 (61.583, -59.2903) -> (61.6194, -59.3182) construction
  spline S61 degree 3 poles (61.6194, -59.3182) (61.6359, -59.3311) (61.6518, -59.3446) (61.6678, -59.3581) knots 18 18 18 18 19 19 19 19
  line L234 (61.6194, -59.3182) -> (61.6359, -59.3311) construction
  line L235 (61.6359, -59.3311) -> (61.6518, -59.3446) construction
  line L236 (61.6518, -59.3446) -> (61.6678, -59.3581) construction
  spline S62 degree 3 poles (61.6678, -59.3581) (61.7991, -59.4685) (61.9084, -59.6011) (61.9919, -59.7522) knots 19 19 19 19 20 20 20 20
  line L237 (61.6678, -59.3581) -> (61.7991, -59.4685) construction
  line L238 (61.7991, -59.4685) -> (61.9084, -59.6011) construction
  line L239 (61.9084, -59.6011) -> (61.9919, -59.7522) construction
  spline S63 degree 3 poles (61.9919, -59.7522) (61.9919, -59.7522) (61.9919, -59.7523) (61.9919, -59.7523) knots 20 20 20 20 21 21 21 21
  line L240 (61.9919, -59.7522) -> (61.9919, -59.7522) construction
  line L241 (61.9919, -59.7522) -> (61.9919, -59.7523) construction
  line L242 (61.9919, -59.7523) -> (61.9919, -59.7523) construction
  spline S64 degree 3 poles (61.9919, -59.7523) (62.1024, -59.9523) (62.1709, -60.1788) (62.1709, -60.4235) (62.1709, -61.195) (61.5454, -61.8205) (60.7739, -61.8205) knots 22 22 22 22 23 23 23 24 24 24 24
  line L243 (61.9919, -59.7523) -> (62.1024, -59.9523) construction
  line L244 (62.1024, -59.9523) -> (62.1709, -60.1788) construction
  line L245 (62.1709, -60.1788) -> (62.1709, -60.4235) construction
  line L246 (62.1709, -60.4235) -> (62.1709, -61.195) construction
  line L247 (62.1709, -61.195) -> (61.5454, -61.8205) construction
  line L248 (61.5454, -61.8205) -> (60.7739, -61.8205) construction
  spline S65 degree 3 poles (62.5971, -57.5872) (62.5971, -57.8109) (62.5744, -58.029) (62.5405, -58.2435) knots 0 0 0 0 1 1 1 1
  line L249 (62.5971, -57.5872) -> (62.5971, -57.8109) construction
  line L250 (62.5971, -57.8109) -> (62.5744, -58.029) construction
  line L251 (62.5744, -58.029) -> (62.5405, -58.2435) construction
  spline S66 degree 3 poles (62.5405, -58.2435) (62.0576, -57.8514) (61.443, -57.6154) (60.7739, -57.6154) (59.2255, -57.6154) (57.9658, -58.8751) (57.9658, -60.4235) (57.9658, -60.9323) (58.1039, -61.4085) (58.3414, -61.8205) knots 1 1 1 1 2 2 2 3 3 3 4 4 4 4
  line L252 (62.5405, -58.2435) -> (62.0576, -57.8514) construction
  line L253 (62.0576, -57.8514) -> (61.443, -57.6154) construction
  line L254 (61.443, -57.6154) -> (60.7739, -57.6154) construction
  line L255 (60.7739, -57.6154) -> (59.2255, -57.6154) construction
  line L256 (59.2255, -57.6154) -> (57.9658, -58.8751) construction
  line L257 (57.9658, -58.8751) -> (57.9658, -60.4235) construction
  line L258 (57.9658, -60.4235) -> (57.9658, -60.9323) construction
  line L259 (57.9658, -60.9323) -> (58.1039, -61.4085) construction
  line L260 (58.1039, -61.4085) -> (58.3414, -61.8205) construction
  line L261 (58.3414, -61.8205) -> (19.6354, -61.8205)
  spline S67 degree 3 poles (19.6354, -61.8205) (19.5417, -61.8205) (19.4499, -61.8124) (19.3576, -61.8064) knots 5 5 5 5 6 6 6 6
  line L262 (19.6354, -61.8205) -> (19.5417, -61.8205) construction
  line L263 (19.5417, -61.8205) -> (19.4499, -61.8124) construction
  line L264 (19.4499, -61.8124) -> (19.3576, -61.8064) construction
  spline S68 degree 3 poles (19.3576, -61.8064) (19.5901, -61.3976) (19.7247, -60.9264) (19.7247, -60.4235) (19.7247, -58.8751) (18.465, -57.6154) (16.9166, -57.6154) (16.3697, -57.6154) (15.8605, -57.775) (15.4284, -58.0465) knots 6 6 6 6 7 7 7 8 8 8 9 9 9 9
  line L265 (19.3576, -61.8064) -> (19.5901, -61.3976) construction
  line L266 (19.5901, -61.3976) -> (19.7247, -60.9264) construction
  line L267 (19.7247, -60.9264) -> (19.7247, -60.4235) construction
  line L268 (19.7247, -60.4235) -> (19.7247, -58.8751) construction
  line L269 (19.7247, -58.8751) -> (18.465, -57.6154) construction
  line L270 (18.465, -57.6154) -> (16.9166, -57.6154) construction
  line L271 (16.9166, -57.6154) -> (16.3697, -57.6154) construction
  line L272 (16.3697, -57.6154) -> (15.8605, -57.775) construction
  line L273 (15.8605, -57.775) -> (15.4284, -58.0465) construction
  spline S69 degree 3 poles (15.4284, -58.0465) (15.4119, -57.8954) (15.4021, -57.7424) (15.4021, -57.5872) knots 9 9 9 9 10 10 10 10
  line L274 (15.4284, -58.0465) -> (15.4119, -57.8954) construction
  line L275 (15.4119, -57.8954) -> (15.4021, -57.7424) construction
  line L276 (15.4021, -57.7424) -> (15.4021, -57.5872) construction
  line L277 (15.4021, -57.5872) -> (15.4021, -19.3178)
  spline S70 degree 3 poles (15.4021, -19.3178) (15.4021, -19.1707) (15.4099, -19.0254) (15.4248, -18.882) knots 11 11 11 11 12 12 12 12
  line L278 (15.4021, -19.3178) -> (15.4021, -19.1707) construction
  line L279 (15.4021, -19.1707) -> (15.4099, -19.0254) construction
  line L280 (15.4099, -19.0254) -> (15.4248, -18.882) construction
  spline S71 degree 3 poles (15.4248, -18.882) (15.8486, -19.1389) (16.3435, -19.2896) (16.8742, -19.2896) (18.4226, -19.2896) (19.6823, -18.0299) (19.6823, -16.4815) (19.6823, -15.9795) (19.5483, -15.5089) (19.3165, -15.1007) knots 12 12 12 12 13 13 13 14 14 14 15 15 15 15
  line L281 (15.4248, -18.882) -> (15.8486, -19.1389) construction
  line L282 (15.8486, -19.1389) -> (16.3435, -19.2896) construction
  line L283 (16.3435, -19.2896) -> (16.8742, -19.2896) construction
  line L284 (16.8742, -19.2896) -> (18.4226, -19.2896) construction
  line L285 (18.4226, -19.2896) -> (19.6823, -18.0299) construction
  line L286 (19.6823, -18.0299) -> (19.6823, -16.4815) construction
  line L287 (19.6823, -16.4815) -> (19.6823, -15.9795) construction
  line L288 (19.6823, -15.9795) -> (19.5483, -15.5089) construction
  line L289 (19.5483, -15.5089) -> (19.3165, -15.1007) construction
  spline S72 degree 3 poles (19.3165, -15.1007) (19.4222, -15.0927) (19.5278, -15.0845) (19.6354, -15.0845) knots 15 15 15 15 16 16 16 16
  line L290 (19.3165, -15.1007) -> (19.4222, -15.0927) construction
  line L291 (19.4222, -15.0927) -> (19.5278, -15.0845) construction
  line L292 (19.5278, -15.0845) -> (19.6354, -15.0845) construction
  spline S73 degree 3 poles (58.3414, -15.0845) (58.1039, -15.4965) (57.9658, -15.9727) (57.9658, -16.4815) (57.9658, -18.0299) (59.2255, -19.2896) (60.7739, -19.2896) (61.443, -19.2896) (62.0576, -19.0536) (62.5405, -18.6614) knots 17 17 17 17 18 18 18 19 19 19 20 20 20 20
  line L293 (58.3414, -15.0845) -> (58.1039, -15.4965) construction
  line L294 (58.1039, -15.4965) -> (57.9658, -15.9727) construction
  line L295 (57.9658, -15.9727) -> (57.9658, -16.4815) construction
  line L296 (57.9658, -16.4815) -> (57.9658, -18.0299) construction
  line L297 (57.9658, -18.0299) -> (59.2255, -19.2896) construction
  line L298 (59.2255, -19.2896) -> (60.7739, -19.2896) construction
  line L299 (60.7739, -19.2896) -> (61.443, -19.2896) construction
  line L300 (61.443, -19.2896) -> (62.0576, -19.0536) construction
  line L301 (62.0576, -19.0536) -> (62.5405, -18.6614) construction
  spline S74 degree 3 poles (62.5405, -18.6614) (62.5744, -18.876) (62.5971, -19.0941) (62.5971, -19.3178) knots 20 20 20 20 21 21 21 21
  line L302 (62.5405, -18.6614) -> (62.5744, -18.876) construction
  line L303 (62.5744, -18.876) -> (62.5971, -19.0941) construction
  line L304 (62.5971, -19.0941) -> (62.5971, -19.3178) construction
  line L305 (62.5989, -19.3178) -> (62.6148, -57.5872)
  point P0 (0, 0)
sketch "Sketch2" plane through (0, 0, 0) normal (0, 1, 0) x (-1, 0, 0)
  arc A0 (15.4198, -18.8831) -> (19.312, -15.1063) centre (16.8686, -16.4822) ccw
  arc A1 (19.312, -61.8046) -> (15.4198, -58.0465) centre (16.9261, -60.381) ccw
  arc A2 (62.5444, -58.244) -> (58.3471, -61.8046) centre (60.767, -60.4029) ccw
  arc A3 (58.3471, -15.1063) -> (62.5444, -18.6734) centre (60.7755, -16.5019) ccw
  line L0 (62.4312, -11.5226) -> (14.8247, -11.5226)
  line L1 (11.8247, -14.5226) -> (11.8247, -61.8396)
  line L2 (14.8247, -64.8396) -> (62.4312, -64.8396)
  line L3 (65.4312, -61.8396) -> (65.4312, -14.5226)
  arc A4 (62.4312, -64.8396) -> (65.4312, -61.8396) centre (62.4312, -61.8396) ccw
  arc A5 (11.8247, -61.8396) -> (14.8247, -64.8396) centre (14.8247, -61.8396) ccw
  arc A6 (14.8247, -11.5226) -> (11.8247, -14.5226) centre (14.8247, -14.5226) ccw
  arc A7 (65.4312, -14.5226) -> (62.4312, -11.5226) centre (62.4312, -14.5226) ccw
  line L4 (58.3471, -15.1063) -> (45.232, -15.1063)
  line L5 (19.312, -15.1063) -> (31.812, -15.1063)
  line L6 (31.812, -15.1063) -> (31.812, -14.1063)
  line L7 (31.812, -14.1063) -> (45.232, -14.1063)
  line L8 (45.232, -14.1063) -> (45.232, -15.1063)
  line L9 (15.4198, -18.8831) -> (15.4198, -31.3831)
  line L10 (15.4198, -31.3831) -> (14.4198, -31.3831)
  line L11 (15.4198, -58.0465) -> (15.4198, -45.5465)
  line L12 (15.4198, -45.5465) -> (14.4198, -45.5465)
  line L13 (14.4198, -45.5465) -> (14.4198, -31.3831)
  line L14 (19.312, -61.8046) -> (31.812, -61.8046)
  line L15 (58.3471, -61.8046) -> (45.8471, -61.8046)
  line L16 (45.8471, -61.8046) -> (45.8471, -62.8046)
  line L17 (45.8471, -62.8046) -> (31.812, -62.8046)
  line L18 (31.812, -62.8046) -> (31.812, -61.8046)
  line L19 (62.5444, -18.6734) -> (62.5444, -31.1734)
  line L20 (62.5444, -58.244) -> (62.5444, -45.744)
  line L21 (62.5444, -45.744) -> (63.5444, -45.744)
  line L22 (63.5444, -45.744) -> (63.5444, -31.1734)
  line L23 (63.5444, -31.1734) -> (62.5444, -31.1734)
  circle A8 centre (60.7791, -16.4067) radius 1.55
  circle A9 centre (60.767, -60.4029) radius 1.55
  circle A10 centre (16.7694, -60.4038) radius 1.55
  circle A11 centre (16.7694, -16.4067) radius 1.55
  point P0 (0, 0)
  dimension "d1" = 3
  dimension "d2" = 3
  dimension "d8" = 47.6065
  dimension "d11" = 12.5
  dimension "d12" = 1
  dimension "d13" = 12.5
  dimension "d14" = 1
  dimension "d15" = 12.5
  dimension "d16" = 12.5
  dimension "d17" = 12.5
  dimension "d18" = 1
  dimension "d19" = 12.5
  dimension "d20" = 12.5
  dimension "d21" = 1
  dimension "d22" = 3.1
  dimension "d24" = 53.6065
  dimension "d25" = 3.1
  dimension "d26" = 3.1
  dimension "d27" = 3.1
extrude "Extrusion2" add sketch "Sketch2" along normal blind 3.1
properties part number "keyboard_space_cad"
